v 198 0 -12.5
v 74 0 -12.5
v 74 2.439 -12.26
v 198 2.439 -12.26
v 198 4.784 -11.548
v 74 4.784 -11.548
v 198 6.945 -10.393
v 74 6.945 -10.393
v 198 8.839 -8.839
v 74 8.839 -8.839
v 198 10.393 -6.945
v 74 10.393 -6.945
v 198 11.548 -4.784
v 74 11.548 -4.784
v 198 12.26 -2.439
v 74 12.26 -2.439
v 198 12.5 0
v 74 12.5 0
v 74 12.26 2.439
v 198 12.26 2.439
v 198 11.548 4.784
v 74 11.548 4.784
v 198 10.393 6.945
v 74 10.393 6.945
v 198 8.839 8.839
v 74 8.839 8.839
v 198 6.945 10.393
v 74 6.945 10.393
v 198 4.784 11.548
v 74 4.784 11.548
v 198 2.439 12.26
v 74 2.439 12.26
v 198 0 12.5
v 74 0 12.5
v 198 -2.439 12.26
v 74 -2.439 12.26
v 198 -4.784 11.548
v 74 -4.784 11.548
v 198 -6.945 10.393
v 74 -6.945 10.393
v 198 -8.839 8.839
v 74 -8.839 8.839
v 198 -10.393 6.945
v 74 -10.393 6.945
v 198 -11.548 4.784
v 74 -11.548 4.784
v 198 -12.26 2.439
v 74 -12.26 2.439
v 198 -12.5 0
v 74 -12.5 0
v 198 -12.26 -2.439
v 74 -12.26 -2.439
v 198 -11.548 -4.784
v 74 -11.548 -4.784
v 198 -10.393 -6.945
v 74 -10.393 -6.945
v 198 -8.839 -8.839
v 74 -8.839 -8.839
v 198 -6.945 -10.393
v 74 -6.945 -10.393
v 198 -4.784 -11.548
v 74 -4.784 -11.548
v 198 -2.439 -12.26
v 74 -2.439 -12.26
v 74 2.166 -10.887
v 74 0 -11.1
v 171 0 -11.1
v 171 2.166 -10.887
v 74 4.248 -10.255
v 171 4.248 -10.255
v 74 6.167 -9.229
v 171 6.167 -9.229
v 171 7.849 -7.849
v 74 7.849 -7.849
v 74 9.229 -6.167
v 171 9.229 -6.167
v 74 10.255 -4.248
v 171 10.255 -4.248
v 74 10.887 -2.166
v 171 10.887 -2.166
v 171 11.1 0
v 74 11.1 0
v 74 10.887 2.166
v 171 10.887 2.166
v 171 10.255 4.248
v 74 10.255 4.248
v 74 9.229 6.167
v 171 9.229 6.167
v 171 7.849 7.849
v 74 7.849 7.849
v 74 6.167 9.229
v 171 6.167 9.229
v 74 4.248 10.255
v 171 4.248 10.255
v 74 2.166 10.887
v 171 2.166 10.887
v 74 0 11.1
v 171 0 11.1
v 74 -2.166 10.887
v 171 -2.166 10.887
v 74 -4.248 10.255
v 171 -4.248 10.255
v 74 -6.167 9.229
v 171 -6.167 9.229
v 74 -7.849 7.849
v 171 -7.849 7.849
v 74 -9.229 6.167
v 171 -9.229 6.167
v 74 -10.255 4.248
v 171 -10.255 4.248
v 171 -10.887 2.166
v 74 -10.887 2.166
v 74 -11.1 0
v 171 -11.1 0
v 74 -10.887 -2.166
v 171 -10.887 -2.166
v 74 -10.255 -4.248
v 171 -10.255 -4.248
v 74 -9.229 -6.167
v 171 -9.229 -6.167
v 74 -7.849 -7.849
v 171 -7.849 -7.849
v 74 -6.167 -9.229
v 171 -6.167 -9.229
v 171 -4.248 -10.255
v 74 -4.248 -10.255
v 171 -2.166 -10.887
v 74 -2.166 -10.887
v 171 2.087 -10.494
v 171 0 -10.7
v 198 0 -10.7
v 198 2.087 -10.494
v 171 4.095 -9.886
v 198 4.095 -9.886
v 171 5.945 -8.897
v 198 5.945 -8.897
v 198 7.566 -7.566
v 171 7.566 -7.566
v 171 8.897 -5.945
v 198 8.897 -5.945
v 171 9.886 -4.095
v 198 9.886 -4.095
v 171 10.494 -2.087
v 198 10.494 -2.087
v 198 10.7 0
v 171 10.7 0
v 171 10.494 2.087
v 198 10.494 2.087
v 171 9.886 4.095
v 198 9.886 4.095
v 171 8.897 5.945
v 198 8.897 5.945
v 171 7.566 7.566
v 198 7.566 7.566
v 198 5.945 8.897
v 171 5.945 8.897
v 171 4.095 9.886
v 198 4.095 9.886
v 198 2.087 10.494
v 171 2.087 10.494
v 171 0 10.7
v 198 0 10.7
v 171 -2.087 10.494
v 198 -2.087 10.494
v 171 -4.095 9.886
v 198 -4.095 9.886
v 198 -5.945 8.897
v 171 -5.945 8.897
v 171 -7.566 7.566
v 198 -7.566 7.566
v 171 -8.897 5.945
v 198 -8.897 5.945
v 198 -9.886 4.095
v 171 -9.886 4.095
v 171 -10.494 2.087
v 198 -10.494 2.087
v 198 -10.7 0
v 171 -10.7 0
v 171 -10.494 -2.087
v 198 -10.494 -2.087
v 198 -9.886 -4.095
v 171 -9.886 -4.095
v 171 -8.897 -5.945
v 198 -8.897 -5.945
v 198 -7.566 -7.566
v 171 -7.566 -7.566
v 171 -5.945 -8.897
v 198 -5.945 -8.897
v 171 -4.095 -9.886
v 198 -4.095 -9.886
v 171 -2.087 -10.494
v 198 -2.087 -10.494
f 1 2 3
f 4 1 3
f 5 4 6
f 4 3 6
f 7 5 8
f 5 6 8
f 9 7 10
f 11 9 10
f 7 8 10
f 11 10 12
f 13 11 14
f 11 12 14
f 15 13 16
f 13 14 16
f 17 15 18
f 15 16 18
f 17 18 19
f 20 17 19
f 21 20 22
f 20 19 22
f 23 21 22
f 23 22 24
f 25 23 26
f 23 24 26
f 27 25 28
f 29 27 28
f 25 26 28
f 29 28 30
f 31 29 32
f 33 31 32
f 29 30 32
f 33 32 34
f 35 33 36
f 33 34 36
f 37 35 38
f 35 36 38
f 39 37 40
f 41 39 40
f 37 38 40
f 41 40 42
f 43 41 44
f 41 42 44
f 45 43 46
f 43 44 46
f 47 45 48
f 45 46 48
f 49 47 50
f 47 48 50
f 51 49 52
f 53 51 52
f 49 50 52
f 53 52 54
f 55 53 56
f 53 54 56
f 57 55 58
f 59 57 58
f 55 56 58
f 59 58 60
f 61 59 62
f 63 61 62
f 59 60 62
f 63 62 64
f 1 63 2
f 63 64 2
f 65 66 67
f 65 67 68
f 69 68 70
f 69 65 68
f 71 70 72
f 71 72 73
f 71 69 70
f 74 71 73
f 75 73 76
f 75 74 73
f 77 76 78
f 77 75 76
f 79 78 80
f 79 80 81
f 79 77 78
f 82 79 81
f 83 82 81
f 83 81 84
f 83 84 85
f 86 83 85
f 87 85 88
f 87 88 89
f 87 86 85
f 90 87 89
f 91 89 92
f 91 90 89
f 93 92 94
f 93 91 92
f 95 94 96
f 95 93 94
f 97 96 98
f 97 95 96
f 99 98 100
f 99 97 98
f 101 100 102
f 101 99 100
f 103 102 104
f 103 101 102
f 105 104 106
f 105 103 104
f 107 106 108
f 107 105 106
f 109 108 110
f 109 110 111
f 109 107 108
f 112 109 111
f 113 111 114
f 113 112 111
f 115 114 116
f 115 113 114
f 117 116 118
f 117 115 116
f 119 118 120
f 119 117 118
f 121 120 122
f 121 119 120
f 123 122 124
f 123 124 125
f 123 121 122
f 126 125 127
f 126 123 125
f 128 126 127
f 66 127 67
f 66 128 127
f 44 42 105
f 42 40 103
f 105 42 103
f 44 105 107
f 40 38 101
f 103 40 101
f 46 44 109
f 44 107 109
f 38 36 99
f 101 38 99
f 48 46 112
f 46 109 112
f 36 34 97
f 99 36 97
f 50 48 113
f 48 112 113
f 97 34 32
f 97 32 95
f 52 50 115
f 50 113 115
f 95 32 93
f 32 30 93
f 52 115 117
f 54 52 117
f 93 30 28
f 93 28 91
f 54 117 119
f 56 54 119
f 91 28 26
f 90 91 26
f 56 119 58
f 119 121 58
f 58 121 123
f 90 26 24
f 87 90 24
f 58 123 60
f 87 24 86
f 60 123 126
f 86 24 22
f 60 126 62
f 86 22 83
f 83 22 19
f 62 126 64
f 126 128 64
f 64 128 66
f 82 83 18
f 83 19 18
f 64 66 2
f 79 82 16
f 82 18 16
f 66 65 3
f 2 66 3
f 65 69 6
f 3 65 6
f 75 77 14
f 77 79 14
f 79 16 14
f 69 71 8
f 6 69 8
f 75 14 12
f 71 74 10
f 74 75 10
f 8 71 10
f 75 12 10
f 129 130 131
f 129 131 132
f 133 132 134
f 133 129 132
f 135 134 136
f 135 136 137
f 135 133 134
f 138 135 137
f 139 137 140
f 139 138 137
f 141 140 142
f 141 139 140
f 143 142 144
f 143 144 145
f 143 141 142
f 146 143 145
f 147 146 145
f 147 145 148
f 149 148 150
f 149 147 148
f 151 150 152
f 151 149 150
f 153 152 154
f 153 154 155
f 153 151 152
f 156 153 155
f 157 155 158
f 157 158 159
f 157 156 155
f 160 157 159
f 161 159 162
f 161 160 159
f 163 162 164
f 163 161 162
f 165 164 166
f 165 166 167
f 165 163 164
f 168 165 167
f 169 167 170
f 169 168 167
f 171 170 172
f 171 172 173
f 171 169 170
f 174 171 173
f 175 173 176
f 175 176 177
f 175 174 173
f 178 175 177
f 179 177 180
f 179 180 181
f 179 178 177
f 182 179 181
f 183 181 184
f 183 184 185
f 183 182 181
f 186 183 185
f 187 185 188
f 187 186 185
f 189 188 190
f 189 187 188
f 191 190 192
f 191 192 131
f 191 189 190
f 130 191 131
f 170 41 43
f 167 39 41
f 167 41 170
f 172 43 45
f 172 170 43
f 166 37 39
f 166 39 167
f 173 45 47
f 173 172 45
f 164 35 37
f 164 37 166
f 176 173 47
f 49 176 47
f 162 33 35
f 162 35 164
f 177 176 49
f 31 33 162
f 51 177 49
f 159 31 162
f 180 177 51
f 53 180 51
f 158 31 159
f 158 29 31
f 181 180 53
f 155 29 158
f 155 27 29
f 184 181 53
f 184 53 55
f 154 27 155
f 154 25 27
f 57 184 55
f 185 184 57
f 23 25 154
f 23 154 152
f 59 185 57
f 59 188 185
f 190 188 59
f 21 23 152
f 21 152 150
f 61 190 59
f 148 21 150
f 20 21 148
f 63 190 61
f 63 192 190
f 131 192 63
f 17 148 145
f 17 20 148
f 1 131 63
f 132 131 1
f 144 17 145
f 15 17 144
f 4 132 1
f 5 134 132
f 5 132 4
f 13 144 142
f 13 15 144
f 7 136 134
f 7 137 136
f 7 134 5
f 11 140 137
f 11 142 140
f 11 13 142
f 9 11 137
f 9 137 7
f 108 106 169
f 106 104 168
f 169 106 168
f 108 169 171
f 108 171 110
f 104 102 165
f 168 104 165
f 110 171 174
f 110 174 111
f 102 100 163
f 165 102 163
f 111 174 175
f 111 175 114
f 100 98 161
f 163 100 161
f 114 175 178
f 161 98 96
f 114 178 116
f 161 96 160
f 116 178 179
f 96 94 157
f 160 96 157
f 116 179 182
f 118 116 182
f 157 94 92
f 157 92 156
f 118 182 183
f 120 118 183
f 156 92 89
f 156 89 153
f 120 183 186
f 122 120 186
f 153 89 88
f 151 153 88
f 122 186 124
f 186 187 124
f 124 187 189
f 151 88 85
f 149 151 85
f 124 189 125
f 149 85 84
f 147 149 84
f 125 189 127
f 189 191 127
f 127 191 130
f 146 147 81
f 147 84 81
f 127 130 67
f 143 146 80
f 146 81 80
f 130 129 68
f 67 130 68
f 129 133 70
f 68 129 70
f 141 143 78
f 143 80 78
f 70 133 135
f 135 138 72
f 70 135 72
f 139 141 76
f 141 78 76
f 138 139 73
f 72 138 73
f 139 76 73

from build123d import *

# Parameters (mm, degrees)
CYLINDER004_R           = 10.7
CYLINDER004_DEPTH       = 27
CYLINDER004_PITCH_ANGLE = 90
CYLINDER003_R           = 11.1
CYLINDER003_DEPTH       = 97
CYLINDER003_PITCH_ANGLE = 90
CYLINDER002_R           = 12.5
CYLINDER002_DEPTH       = 124
CYLINDER002_PITCH_ANGLE = 90


with BuildPart() as cylinder002:
    # Cylinder004 → Cylinder004 (new body)
    with BuildSketch(Plane.XY):
        Circle(CYLINDER004_R)
    extrude(amount=CYLINDER004_DEPTH)


with BuildPart() as cylinder002_1:
    # Cylinder004 pitch: moved
    add(cylinder002.part.rotate(Axis((0, 0, 0), (0, 1, 0)), CYLINDER004_PITCH_ANGLE))


with BuildPart() as cylinder002_2:
    # Cylinder004 placement: moved
    add(cylinder002_1.part.moved(Location((171, 0, 0))))


with BuildPart() as cylinder001:
    # Cylinder003 → Cylinder003 (new body)
    with BuildSketch(Plane.XY):
        Circle(CYLINDER003_R)
    extrude(amount=CYLINDER003_DEPTH)


with BuildPart() as cylinder001_1:
    # Cylinder003 pitch: moved
    add(cylinder001.part.rotate(Axis((0, 0, 0), (0, 1, 0)), CYLINDER003_PITCH_ANGLE))


with BuildPart() as cylinder001_2:
    # Cylinder003 placement: moved
    add(cylinder001_1.part.moved(Location((74, 0, 0))))


with BuildPart() as batteryholder:
    # Cylinder002 → Cylinder002 (new body)
    with BuildSketch(Plane.XY):
        Circle(CYLINDER002_R)
    extrude(amount=CYLINDER002_DEPTH)


with BuildPart() as batteryholder_1:
    # Cylinder002 pitch: moved
    add(batteryholder.part.rotate(Axis((0, 0, 0), (0, 1, 0)), CYLINDER002_PITCH_ANGLE))


with BuildPart() as batteryholder_2:
    # Cylinder002 placement: moved
    add(batteryholder_1.part.moved(Location((74, 0, 0))))

    # Cut001: cut Cylinder001
    add(cylinder001_2.part, mode=Mode.SUBTRACT)

    # Cut002: cut Cylinder002
    add(cylinder002_2.part, mode=Mode.SUBTRACT)


solid = batteryholder_2.part
